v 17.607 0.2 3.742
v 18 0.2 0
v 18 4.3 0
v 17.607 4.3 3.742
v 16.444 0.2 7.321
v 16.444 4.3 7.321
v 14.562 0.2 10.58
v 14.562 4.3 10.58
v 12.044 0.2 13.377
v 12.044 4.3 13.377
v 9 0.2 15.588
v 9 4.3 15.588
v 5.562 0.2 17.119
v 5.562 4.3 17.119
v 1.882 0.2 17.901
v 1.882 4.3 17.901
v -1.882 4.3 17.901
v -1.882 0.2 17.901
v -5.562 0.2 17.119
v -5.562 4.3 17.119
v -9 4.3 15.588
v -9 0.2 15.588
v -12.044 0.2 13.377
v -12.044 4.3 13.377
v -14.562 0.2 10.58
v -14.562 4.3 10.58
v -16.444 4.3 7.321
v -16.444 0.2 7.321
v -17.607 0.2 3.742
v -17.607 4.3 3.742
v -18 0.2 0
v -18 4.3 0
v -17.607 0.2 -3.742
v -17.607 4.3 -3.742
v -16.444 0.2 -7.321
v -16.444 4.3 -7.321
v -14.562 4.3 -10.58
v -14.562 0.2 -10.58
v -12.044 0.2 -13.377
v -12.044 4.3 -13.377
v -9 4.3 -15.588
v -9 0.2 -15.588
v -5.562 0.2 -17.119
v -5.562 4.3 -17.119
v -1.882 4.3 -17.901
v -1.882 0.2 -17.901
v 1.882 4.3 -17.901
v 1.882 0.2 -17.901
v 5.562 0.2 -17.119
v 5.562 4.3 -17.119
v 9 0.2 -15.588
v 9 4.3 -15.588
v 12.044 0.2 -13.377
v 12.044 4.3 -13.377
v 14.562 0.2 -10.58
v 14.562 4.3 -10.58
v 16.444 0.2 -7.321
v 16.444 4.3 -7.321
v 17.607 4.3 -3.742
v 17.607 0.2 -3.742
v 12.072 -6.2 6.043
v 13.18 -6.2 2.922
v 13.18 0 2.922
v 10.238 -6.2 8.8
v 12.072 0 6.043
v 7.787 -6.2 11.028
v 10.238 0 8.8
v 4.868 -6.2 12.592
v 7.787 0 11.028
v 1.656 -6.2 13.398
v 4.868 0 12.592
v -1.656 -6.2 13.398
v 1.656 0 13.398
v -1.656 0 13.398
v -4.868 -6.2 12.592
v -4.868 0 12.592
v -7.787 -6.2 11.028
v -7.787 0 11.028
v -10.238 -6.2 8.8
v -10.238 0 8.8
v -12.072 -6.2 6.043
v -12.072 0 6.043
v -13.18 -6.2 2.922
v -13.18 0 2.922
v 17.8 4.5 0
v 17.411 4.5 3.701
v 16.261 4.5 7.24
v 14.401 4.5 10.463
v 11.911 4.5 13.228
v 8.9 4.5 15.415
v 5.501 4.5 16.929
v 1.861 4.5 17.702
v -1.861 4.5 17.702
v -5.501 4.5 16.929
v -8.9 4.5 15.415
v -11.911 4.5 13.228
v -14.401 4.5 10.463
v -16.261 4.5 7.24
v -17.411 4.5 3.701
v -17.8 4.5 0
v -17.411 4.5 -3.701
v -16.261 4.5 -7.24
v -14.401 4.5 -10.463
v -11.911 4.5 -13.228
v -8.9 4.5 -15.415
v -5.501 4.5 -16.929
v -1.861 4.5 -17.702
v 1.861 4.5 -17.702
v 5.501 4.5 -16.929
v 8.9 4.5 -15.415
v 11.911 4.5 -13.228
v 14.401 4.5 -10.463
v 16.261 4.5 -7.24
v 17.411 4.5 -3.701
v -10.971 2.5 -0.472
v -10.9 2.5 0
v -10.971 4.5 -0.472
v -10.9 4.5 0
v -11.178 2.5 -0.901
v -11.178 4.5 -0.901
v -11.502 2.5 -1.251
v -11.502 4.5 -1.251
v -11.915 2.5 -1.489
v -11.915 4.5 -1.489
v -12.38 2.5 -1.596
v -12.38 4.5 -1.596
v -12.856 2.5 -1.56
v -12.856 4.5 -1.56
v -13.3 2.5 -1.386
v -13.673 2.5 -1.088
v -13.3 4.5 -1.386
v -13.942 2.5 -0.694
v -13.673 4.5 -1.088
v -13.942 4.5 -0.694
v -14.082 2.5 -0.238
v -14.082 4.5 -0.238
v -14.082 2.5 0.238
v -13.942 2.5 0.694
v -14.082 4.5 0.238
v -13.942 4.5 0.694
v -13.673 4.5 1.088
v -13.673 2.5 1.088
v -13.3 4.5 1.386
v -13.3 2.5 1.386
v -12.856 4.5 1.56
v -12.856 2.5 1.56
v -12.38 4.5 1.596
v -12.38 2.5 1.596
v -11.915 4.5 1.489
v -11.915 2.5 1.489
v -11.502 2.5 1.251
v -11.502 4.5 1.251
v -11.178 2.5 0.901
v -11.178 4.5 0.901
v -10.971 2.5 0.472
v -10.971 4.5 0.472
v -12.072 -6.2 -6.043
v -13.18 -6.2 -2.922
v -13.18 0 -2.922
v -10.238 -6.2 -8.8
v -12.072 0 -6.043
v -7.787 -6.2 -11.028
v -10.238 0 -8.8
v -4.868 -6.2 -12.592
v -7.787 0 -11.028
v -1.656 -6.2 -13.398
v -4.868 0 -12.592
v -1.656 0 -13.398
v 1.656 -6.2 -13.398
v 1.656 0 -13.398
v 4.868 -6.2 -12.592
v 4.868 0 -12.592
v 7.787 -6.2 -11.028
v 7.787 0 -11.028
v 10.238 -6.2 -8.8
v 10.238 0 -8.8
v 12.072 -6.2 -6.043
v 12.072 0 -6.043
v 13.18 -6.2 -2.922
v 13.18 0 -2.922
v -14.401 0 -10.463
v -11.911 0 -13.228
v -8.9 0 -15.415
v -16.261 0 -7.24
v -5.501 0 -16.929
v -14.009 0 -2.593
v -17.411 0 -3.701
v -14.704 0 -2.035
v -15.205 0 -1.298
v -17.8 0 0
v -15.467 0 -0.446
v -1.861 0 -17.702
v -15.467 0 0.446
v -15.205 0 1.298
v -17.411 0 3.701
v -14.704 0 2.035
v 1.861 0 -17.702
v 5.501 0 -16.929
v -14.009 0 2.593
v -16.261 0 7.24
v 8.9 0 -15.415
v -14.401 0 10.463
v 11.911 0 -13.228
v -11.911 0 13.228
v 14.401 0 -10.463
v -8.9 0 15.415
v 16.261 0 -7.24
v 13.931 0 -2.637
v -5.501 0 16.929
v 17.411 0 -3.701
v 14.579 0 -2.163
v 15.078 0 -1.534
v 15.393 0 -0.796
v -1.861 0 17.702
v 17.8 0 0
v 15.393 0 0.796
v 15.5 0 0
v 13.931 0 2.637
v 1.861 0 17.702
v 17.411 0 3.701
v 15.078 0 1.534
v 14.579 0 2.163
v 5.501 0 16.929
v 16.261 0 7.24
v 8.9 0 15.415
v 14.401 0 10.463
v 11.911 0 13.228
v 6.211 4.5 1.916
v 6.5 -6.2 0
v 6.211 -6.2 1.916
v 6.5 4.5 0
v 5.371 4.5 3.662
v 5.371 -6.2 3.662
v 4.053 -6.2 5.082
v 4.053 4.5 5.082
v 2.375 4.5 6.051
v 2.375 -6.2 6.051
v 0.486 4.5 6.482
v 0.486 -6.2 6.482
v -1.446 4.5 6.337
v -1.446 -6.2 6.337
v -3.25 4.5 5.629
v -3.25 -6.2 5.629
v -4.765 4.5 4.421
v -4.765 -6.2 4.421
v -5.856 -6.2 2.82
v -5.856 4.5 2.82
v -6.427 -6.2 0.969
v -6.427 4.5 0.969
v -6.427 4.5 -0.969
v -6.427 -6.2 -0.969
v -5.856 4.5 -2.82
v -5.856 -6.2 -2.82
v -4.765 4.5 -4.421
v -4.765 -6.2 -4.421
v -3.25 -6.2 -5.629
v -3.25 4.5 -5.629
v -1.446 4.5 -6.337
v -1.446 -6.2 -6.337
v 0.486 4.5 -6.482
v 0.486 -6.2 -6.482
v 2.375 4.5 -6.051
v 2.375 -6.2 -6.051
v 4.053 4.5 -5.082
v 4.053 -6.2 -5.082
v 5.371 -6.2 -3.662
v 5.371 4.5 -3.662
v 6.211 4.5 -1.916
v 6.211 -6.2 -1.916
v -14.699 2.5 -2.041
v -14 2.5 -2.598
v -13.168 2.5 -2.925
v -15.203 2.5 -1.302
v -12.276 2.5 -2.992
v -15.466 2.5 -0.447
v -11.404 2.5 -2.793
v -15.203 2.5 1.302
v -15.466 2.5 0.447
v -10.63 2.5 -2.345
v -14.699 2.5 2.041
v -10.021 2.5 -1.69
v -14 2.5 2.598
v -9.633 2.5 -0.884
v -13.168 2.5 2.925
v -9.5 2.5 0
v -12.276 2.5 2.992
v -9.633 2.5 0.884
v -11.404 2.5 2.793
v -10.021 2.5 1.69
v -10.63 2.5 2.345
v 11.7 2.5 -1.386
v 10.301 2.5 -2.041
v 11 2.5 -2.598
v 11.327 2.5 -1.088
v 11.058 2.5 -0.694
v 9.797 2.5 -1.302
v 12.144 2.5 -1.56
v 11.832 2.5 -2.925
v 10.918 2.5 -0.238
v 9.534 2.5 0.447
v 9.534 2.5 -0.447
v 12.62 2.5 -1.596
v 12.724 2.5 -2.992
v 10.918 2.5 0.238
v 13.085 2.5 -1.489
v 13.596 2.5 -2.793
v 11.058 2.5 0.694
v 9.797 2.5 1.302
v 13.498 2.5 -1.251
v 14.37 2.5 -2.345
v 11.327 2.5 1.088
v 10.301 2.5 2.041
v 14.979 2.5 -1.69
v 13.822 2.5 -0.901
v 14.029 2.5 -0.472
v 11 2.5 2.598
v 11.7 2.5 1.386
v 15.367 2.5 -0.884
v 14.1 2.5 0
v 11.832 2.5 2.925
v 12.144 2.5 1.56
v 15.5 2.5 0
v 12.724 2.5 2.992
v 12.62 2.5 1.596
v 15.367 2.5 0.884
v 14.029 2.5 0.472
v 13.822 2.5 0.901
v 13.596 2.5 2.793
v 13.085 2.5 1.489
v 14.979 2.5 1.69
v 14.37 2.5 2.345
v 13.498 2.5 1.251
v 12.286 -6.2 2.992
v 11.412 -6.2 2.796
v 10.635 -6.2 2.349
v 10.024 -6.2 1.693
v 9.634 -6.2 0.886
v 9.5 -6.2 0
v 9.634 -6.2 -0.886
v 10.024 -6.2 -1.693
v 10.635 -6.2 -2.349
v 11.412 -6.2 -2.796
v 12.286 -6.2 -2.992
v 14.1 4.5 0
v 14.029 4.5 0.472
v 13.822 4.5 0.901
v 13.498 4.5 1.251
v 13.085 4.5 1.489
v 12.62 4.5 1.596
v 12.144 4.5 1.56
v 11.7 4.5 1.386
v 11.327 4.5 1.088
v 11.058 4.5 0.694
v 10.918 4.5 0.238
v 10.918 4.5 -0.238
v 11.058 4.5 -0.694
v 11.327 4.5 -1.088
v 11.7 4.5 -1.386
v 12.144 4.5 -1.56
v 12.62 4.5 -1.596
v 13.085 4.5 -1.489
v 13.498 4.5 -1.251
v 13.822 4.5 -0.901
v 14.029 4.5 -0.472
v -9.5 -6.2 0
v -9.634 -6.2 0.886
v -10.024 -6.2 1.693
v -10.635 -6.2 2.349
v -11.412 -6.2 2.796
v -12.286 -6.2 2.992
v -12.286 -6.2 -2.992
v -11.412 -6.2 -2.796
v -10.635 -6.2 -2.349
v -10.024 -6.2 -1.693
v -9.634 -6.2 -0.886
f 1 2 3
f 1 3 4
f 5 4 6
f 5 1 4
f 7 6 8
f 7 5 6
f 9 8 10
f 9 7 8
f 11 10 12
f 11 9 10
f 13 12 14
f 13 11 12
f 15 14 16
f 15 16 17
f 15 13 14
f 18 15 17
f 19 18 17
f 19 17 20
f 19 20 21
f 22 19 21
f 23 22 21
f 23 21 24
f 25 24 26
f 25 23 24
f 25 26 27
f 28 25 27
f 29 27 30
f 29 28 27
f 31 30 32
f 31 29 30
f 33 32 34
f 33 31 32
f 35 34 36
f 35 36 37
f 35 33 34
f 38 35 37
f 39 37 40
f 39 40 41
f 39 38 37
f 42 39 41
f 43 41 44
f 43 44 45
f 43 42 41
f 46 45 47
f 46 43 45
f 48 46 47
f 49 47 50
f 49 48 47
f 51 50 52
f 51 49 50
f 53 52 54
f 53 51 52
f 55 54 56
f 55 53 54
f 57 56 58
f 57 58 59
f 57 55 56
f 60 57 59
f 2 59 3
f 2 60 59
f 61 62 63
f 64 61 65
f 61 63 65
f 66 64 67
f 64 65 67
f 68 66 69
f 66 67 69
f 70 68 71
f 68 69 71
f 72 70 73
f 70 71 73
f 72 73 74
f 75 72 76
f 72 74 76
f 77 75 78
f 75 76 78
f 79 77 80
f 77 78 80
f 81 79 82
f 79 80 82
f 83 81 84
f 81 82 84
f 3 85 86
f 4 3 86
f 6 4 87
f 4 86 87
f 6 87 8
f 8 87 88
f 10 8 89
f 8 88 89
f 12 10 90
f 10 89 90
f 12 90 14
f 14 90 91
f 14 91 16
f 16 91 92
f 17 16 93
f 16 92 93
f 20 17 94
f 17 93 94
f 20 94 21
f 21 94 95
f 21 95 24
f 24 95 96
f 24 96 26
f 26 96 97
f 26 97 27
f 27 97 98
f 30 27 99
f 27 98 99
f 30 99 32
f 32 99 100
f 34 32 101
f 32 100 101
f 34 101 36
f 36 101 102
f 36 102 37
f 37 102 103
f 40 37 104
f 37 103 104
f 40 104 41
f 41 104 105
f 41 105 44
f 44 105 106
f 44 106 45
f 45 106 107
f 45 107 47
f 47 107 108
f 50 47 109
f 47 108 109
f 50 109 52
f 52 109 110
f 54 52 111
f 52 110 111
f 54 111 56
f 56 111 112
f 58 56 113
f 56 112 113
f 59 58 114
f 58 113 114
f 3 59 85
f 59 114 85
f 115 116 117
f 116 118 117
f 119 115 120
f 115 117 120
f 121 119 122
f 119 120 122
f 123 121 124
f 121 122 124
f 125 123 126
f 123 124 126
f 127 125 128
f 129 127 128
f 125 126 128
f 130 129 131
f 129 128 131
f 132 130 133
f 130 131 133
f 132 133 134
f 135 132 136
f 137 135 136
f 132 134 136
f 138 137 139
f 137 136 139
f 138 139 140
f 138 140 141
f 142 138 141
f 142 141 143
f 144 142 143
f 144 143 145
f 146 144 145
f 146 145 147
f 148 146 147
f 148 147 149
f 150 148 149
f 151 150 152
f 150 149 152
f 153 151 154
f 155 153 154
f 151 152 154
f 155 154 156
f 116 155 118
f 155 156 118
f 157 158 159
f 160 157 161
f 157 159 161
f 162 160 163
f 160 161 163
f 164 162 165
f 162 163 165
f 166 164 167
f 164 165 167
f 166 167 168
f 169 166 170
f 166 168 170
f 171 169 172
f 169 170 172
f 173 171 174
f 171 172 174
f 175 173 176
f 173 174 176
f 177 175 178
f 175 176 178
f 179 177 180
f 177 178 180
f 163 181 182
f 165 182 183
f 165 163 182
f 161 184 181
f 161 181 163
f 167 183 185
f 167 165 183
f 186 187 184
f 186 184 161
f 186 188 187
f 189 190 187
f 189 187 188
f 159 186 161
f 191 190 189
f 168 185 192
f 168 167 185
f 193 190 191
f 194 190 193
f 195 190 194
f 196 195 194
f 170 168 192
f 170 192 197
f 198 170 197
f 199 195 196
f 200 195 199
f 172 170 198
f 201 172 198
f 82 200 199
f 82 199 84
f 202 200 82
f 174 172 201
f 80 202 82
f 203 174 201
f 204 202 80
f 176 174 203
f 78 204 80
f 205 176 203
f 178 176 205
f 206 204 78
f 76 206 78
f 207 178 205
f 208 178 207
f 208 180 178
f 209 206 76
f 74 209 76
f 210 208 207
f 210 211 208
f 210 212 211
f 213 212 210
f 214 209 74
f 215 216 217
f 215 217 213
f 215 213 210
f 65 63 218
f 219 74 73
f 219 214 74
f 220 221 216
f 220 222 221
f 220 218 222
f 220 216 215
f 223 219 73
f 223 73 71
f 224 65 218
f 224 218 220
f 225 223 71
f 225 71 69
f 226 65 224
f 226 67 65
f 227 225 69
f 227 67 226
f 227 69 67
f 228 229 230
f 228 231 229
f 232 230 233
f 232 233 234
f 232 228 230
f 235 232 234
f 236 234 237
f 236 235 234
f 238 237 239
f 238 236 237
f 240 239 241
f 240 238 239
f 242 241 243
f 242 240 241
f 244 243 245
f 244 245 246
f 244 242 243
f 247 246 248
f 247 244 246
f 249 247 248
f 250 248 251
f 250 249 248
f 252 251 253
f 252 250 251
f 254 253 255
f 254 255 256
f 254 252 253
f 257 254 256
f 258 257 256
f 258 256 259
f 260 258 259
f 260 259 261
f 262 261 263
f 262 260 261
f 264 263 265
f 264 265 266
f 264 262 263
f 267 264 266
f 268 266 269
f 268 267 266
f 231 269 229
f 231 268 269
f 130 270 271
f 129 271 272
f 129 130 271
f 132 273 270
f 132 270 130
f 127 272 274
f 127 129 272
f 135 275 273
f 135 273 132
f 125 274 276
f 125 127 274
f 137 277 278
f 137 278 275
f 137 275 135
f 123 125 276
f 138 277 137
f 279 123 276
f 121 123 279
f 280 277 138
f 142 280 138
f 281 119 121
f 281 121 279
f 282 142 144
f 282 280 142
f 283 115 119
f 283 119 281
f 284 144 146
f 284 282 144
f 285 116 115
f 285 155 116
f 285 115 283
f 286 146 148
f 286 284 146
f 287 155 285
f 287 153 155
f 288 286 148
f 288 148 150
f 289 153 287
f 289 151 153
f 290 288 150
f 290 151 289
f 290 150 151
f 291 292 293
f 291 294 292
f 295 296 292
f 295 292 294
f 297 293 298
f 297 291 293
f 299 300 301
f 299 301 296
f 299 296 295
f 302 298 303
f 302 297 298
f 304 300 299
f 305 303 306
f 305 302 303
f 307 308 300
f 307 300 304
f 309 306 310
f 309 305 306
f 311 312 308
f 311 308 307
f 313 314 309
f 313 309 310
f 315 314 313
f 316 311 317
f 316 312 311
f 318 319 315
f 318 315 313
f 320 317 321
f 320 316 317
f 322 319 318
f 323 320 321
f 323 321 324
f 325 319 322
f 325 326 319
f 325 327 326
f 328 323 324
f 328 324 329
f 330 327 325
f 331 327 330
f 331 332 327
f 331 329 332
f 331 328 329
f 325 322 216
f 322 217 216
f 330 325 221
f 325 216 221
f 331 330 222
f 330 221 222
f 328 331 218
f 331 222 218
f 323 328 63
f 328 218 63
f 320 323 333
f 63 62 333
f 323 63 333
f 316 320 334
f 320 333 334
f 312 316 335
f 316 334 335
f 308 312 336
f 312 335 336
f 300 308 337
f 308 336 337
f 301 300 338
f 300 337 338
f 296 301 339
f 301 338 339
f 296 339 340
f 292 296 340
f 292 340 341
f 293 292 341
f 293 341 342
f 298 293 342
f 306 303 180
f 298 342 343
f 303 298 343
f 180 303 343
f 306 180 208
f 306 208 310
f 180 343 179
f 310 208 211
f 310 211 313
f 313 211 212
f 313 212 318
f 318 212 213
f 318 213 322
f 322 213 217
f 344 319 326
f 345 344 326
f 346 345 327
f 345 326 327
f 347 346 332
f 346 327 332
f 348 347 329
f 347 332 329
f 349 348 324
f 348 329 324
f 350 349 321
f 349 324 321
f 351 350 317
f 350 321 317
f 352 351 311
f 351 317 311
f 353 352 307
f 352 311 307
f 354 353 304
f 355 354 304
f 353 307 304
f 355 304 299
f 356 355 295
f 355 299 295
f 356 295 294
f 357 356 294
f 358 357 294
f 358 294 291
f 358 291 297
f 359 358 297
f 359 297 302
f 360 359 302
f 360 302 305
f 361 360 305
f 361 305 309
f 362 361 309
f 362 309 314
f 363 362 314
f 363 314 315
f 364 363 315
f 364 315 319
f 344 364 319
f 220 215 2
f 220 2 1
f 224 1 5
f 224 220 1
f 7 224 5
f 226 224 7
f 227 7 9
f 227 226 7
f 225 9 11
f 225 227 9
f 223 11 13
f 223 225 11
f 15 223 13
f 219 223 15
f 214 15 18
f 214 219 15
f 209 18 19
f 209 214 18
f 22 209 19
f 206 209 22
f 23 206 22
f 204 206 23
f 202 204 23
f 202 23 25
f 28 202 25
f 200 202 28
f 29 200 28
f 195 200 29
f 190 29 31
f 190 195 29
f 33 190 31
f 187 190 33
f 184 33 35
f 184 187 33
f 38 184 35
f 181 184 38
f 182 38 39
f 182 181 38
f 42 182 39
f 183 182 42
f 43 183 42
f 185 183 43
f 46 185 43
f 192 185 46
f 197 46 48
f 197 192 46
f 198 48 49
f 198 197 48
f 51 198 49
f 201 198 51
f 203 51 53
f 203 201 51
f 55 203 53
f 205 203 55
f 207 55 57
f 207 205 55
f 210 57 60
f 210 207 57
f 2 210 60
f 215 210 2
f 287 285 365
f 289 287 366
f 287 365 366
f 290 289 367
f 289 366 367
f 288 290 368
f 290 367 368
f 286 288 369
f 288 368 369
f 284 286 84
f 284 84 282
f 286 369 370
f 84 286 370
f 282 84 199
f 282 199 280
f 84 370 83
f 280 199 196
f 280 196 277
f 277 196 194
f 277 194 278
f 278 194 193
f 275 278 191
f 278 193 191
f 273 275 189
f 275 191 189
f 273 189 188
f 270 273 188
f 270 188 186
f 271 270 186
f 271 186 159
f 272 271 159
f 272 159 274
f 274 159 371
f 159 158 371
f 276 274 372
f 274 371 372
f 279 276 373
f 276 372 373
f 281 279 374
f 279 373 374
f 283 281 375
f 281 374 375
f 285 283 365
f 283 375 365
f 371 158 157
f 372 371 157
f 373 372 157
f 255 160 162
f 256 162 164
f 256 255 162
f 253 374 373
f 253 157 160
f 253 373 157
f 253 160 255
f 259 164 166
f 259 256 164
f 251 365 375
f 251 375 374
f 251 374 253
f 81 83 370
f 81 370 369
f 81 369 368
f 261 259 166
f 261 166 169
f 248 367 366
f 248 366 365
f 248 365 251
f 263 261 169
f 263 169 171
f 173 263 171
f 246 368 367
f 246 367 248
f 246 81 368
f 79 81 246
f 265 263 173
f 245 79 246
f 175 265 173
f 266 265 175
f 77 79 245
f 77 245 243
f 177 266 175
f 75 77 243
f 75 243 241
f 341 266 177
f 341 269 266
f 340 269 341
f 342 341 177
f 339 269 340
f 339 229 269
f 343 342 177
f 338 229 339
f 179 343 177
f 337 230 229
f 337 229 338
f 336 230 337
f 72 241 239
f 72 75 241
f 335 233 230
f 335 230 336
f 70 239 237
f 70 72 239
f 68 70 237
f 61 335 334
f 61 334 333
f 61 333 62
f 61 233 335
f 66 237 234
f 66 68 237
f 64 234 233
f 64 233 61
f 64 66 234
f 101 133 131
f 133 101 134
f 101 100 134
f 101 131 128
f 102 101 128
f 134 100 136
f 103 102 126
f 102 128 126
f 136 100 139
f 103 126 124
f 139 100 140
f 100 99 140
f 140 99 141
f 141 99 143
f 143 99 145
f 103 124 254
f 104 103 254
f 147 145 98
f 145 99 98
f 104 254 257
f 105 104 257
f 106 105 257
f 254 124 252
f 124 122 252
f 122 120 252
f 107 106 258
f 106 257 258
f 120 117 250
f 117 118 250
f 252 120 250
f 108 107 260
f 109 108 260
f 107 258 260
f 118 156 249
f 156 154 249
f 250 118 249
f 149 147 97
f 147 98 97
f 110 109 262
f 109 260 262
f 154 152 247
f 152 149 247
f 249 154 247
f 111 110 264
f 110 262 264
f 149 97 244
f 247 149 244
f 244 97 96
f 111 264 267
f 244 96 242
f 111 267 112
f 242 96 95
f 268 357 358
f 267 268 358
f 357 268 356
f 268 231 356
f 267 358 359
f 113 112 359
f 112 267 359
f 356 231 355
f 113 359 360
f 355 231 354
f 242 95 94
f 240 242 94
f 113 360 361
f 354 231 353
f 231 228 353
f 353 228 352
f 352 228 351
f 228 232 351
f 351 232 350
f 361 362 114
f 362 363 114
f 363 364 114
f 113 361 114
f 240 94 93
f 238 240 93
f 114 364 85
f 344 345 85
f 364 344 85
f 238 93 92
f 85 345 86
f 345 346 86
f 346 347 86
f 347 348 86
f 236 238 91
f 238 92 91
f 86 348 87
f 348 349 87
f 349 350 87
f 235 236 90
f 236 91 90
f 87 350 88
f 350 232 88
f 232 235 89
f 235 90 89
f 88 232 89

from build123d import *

# Parameters (mm, degrees)
F0_R          = 18
F0_R_2        = 1.6
F0_R_3        = 6.5
F1_DEPTH      = 4.5
F2_SIZE       = 0.2
F3_R          = 6.5
F4_DEPTH      = 6.2
F5_R          = 3
F6_DEPTH      = 2.5
F6_DEPTH_BACK = 6.201


with BuildPart() as f1:
    # F0 (on Front) → F1 (new body)
    with BuildSketch(Plane.XZ):
        Circle(F0_R)
        with Locations((-12.5, 0)):
            Circle(F0_R_2, mode=Mode.SUBTRACT)
        Circle(F0_R_3, mode=Mode.SUBTRACT)
        with Locations((12.5, 0)):
            Circle(F0_R_2, mode=Mode.SUBTRACT)
    extrude(amount=-F1_DEPTH)

    # F2
    f2_edges = [f1.edges().sort_by_distance(p)[0] for p in [
        (-18, 4.5, 0),
        (-18, 0, 0),
    ]]
    chamfer(f2_edges, length=F2_SIZE)

    # F3 (on face) → F4 (join)
    with BuildSketch(Plane.XZ):
        with BuildLine():
            ThreePointArc((-13.4376, 1.2964976822), (-10.9, 0), (-13.4376, -1.2964976822))
            ThreePointArc((-13.4376, -1.2964976822), (0, -13.5), (13.4376, -1.2964976822))
            ThreePointArc((13.4376, -1.2964976822), (10.9, 0), (13.4376, 1.2964976822))
            ThreePointArc((13.4376, 1.2964976822), (0, 13.5), (-13.4376, 1.2964976822))
        make_face()
        Circle(F3_R, mode=Mode.SUBTRACT)
    extrude(amount=F4_DEPTH)

    # F5 (on face) → F6 (cut, two sides)
    with BuildSketch(Plane.XZ) as f6_sk:
        with Locations((-12.5, 0)):
            Circle(F5_R)
        with Locations((12.5, 0)):
            Circle(F5_R)
    extrude(amount=-F6_DEPTH, mode=Mode.SUBTRACT)
    extrude(f6_sk.sketch, amount=F6_DEPTH_BACK, mode=Mode.SUBTRACT)


solid = f1.part
